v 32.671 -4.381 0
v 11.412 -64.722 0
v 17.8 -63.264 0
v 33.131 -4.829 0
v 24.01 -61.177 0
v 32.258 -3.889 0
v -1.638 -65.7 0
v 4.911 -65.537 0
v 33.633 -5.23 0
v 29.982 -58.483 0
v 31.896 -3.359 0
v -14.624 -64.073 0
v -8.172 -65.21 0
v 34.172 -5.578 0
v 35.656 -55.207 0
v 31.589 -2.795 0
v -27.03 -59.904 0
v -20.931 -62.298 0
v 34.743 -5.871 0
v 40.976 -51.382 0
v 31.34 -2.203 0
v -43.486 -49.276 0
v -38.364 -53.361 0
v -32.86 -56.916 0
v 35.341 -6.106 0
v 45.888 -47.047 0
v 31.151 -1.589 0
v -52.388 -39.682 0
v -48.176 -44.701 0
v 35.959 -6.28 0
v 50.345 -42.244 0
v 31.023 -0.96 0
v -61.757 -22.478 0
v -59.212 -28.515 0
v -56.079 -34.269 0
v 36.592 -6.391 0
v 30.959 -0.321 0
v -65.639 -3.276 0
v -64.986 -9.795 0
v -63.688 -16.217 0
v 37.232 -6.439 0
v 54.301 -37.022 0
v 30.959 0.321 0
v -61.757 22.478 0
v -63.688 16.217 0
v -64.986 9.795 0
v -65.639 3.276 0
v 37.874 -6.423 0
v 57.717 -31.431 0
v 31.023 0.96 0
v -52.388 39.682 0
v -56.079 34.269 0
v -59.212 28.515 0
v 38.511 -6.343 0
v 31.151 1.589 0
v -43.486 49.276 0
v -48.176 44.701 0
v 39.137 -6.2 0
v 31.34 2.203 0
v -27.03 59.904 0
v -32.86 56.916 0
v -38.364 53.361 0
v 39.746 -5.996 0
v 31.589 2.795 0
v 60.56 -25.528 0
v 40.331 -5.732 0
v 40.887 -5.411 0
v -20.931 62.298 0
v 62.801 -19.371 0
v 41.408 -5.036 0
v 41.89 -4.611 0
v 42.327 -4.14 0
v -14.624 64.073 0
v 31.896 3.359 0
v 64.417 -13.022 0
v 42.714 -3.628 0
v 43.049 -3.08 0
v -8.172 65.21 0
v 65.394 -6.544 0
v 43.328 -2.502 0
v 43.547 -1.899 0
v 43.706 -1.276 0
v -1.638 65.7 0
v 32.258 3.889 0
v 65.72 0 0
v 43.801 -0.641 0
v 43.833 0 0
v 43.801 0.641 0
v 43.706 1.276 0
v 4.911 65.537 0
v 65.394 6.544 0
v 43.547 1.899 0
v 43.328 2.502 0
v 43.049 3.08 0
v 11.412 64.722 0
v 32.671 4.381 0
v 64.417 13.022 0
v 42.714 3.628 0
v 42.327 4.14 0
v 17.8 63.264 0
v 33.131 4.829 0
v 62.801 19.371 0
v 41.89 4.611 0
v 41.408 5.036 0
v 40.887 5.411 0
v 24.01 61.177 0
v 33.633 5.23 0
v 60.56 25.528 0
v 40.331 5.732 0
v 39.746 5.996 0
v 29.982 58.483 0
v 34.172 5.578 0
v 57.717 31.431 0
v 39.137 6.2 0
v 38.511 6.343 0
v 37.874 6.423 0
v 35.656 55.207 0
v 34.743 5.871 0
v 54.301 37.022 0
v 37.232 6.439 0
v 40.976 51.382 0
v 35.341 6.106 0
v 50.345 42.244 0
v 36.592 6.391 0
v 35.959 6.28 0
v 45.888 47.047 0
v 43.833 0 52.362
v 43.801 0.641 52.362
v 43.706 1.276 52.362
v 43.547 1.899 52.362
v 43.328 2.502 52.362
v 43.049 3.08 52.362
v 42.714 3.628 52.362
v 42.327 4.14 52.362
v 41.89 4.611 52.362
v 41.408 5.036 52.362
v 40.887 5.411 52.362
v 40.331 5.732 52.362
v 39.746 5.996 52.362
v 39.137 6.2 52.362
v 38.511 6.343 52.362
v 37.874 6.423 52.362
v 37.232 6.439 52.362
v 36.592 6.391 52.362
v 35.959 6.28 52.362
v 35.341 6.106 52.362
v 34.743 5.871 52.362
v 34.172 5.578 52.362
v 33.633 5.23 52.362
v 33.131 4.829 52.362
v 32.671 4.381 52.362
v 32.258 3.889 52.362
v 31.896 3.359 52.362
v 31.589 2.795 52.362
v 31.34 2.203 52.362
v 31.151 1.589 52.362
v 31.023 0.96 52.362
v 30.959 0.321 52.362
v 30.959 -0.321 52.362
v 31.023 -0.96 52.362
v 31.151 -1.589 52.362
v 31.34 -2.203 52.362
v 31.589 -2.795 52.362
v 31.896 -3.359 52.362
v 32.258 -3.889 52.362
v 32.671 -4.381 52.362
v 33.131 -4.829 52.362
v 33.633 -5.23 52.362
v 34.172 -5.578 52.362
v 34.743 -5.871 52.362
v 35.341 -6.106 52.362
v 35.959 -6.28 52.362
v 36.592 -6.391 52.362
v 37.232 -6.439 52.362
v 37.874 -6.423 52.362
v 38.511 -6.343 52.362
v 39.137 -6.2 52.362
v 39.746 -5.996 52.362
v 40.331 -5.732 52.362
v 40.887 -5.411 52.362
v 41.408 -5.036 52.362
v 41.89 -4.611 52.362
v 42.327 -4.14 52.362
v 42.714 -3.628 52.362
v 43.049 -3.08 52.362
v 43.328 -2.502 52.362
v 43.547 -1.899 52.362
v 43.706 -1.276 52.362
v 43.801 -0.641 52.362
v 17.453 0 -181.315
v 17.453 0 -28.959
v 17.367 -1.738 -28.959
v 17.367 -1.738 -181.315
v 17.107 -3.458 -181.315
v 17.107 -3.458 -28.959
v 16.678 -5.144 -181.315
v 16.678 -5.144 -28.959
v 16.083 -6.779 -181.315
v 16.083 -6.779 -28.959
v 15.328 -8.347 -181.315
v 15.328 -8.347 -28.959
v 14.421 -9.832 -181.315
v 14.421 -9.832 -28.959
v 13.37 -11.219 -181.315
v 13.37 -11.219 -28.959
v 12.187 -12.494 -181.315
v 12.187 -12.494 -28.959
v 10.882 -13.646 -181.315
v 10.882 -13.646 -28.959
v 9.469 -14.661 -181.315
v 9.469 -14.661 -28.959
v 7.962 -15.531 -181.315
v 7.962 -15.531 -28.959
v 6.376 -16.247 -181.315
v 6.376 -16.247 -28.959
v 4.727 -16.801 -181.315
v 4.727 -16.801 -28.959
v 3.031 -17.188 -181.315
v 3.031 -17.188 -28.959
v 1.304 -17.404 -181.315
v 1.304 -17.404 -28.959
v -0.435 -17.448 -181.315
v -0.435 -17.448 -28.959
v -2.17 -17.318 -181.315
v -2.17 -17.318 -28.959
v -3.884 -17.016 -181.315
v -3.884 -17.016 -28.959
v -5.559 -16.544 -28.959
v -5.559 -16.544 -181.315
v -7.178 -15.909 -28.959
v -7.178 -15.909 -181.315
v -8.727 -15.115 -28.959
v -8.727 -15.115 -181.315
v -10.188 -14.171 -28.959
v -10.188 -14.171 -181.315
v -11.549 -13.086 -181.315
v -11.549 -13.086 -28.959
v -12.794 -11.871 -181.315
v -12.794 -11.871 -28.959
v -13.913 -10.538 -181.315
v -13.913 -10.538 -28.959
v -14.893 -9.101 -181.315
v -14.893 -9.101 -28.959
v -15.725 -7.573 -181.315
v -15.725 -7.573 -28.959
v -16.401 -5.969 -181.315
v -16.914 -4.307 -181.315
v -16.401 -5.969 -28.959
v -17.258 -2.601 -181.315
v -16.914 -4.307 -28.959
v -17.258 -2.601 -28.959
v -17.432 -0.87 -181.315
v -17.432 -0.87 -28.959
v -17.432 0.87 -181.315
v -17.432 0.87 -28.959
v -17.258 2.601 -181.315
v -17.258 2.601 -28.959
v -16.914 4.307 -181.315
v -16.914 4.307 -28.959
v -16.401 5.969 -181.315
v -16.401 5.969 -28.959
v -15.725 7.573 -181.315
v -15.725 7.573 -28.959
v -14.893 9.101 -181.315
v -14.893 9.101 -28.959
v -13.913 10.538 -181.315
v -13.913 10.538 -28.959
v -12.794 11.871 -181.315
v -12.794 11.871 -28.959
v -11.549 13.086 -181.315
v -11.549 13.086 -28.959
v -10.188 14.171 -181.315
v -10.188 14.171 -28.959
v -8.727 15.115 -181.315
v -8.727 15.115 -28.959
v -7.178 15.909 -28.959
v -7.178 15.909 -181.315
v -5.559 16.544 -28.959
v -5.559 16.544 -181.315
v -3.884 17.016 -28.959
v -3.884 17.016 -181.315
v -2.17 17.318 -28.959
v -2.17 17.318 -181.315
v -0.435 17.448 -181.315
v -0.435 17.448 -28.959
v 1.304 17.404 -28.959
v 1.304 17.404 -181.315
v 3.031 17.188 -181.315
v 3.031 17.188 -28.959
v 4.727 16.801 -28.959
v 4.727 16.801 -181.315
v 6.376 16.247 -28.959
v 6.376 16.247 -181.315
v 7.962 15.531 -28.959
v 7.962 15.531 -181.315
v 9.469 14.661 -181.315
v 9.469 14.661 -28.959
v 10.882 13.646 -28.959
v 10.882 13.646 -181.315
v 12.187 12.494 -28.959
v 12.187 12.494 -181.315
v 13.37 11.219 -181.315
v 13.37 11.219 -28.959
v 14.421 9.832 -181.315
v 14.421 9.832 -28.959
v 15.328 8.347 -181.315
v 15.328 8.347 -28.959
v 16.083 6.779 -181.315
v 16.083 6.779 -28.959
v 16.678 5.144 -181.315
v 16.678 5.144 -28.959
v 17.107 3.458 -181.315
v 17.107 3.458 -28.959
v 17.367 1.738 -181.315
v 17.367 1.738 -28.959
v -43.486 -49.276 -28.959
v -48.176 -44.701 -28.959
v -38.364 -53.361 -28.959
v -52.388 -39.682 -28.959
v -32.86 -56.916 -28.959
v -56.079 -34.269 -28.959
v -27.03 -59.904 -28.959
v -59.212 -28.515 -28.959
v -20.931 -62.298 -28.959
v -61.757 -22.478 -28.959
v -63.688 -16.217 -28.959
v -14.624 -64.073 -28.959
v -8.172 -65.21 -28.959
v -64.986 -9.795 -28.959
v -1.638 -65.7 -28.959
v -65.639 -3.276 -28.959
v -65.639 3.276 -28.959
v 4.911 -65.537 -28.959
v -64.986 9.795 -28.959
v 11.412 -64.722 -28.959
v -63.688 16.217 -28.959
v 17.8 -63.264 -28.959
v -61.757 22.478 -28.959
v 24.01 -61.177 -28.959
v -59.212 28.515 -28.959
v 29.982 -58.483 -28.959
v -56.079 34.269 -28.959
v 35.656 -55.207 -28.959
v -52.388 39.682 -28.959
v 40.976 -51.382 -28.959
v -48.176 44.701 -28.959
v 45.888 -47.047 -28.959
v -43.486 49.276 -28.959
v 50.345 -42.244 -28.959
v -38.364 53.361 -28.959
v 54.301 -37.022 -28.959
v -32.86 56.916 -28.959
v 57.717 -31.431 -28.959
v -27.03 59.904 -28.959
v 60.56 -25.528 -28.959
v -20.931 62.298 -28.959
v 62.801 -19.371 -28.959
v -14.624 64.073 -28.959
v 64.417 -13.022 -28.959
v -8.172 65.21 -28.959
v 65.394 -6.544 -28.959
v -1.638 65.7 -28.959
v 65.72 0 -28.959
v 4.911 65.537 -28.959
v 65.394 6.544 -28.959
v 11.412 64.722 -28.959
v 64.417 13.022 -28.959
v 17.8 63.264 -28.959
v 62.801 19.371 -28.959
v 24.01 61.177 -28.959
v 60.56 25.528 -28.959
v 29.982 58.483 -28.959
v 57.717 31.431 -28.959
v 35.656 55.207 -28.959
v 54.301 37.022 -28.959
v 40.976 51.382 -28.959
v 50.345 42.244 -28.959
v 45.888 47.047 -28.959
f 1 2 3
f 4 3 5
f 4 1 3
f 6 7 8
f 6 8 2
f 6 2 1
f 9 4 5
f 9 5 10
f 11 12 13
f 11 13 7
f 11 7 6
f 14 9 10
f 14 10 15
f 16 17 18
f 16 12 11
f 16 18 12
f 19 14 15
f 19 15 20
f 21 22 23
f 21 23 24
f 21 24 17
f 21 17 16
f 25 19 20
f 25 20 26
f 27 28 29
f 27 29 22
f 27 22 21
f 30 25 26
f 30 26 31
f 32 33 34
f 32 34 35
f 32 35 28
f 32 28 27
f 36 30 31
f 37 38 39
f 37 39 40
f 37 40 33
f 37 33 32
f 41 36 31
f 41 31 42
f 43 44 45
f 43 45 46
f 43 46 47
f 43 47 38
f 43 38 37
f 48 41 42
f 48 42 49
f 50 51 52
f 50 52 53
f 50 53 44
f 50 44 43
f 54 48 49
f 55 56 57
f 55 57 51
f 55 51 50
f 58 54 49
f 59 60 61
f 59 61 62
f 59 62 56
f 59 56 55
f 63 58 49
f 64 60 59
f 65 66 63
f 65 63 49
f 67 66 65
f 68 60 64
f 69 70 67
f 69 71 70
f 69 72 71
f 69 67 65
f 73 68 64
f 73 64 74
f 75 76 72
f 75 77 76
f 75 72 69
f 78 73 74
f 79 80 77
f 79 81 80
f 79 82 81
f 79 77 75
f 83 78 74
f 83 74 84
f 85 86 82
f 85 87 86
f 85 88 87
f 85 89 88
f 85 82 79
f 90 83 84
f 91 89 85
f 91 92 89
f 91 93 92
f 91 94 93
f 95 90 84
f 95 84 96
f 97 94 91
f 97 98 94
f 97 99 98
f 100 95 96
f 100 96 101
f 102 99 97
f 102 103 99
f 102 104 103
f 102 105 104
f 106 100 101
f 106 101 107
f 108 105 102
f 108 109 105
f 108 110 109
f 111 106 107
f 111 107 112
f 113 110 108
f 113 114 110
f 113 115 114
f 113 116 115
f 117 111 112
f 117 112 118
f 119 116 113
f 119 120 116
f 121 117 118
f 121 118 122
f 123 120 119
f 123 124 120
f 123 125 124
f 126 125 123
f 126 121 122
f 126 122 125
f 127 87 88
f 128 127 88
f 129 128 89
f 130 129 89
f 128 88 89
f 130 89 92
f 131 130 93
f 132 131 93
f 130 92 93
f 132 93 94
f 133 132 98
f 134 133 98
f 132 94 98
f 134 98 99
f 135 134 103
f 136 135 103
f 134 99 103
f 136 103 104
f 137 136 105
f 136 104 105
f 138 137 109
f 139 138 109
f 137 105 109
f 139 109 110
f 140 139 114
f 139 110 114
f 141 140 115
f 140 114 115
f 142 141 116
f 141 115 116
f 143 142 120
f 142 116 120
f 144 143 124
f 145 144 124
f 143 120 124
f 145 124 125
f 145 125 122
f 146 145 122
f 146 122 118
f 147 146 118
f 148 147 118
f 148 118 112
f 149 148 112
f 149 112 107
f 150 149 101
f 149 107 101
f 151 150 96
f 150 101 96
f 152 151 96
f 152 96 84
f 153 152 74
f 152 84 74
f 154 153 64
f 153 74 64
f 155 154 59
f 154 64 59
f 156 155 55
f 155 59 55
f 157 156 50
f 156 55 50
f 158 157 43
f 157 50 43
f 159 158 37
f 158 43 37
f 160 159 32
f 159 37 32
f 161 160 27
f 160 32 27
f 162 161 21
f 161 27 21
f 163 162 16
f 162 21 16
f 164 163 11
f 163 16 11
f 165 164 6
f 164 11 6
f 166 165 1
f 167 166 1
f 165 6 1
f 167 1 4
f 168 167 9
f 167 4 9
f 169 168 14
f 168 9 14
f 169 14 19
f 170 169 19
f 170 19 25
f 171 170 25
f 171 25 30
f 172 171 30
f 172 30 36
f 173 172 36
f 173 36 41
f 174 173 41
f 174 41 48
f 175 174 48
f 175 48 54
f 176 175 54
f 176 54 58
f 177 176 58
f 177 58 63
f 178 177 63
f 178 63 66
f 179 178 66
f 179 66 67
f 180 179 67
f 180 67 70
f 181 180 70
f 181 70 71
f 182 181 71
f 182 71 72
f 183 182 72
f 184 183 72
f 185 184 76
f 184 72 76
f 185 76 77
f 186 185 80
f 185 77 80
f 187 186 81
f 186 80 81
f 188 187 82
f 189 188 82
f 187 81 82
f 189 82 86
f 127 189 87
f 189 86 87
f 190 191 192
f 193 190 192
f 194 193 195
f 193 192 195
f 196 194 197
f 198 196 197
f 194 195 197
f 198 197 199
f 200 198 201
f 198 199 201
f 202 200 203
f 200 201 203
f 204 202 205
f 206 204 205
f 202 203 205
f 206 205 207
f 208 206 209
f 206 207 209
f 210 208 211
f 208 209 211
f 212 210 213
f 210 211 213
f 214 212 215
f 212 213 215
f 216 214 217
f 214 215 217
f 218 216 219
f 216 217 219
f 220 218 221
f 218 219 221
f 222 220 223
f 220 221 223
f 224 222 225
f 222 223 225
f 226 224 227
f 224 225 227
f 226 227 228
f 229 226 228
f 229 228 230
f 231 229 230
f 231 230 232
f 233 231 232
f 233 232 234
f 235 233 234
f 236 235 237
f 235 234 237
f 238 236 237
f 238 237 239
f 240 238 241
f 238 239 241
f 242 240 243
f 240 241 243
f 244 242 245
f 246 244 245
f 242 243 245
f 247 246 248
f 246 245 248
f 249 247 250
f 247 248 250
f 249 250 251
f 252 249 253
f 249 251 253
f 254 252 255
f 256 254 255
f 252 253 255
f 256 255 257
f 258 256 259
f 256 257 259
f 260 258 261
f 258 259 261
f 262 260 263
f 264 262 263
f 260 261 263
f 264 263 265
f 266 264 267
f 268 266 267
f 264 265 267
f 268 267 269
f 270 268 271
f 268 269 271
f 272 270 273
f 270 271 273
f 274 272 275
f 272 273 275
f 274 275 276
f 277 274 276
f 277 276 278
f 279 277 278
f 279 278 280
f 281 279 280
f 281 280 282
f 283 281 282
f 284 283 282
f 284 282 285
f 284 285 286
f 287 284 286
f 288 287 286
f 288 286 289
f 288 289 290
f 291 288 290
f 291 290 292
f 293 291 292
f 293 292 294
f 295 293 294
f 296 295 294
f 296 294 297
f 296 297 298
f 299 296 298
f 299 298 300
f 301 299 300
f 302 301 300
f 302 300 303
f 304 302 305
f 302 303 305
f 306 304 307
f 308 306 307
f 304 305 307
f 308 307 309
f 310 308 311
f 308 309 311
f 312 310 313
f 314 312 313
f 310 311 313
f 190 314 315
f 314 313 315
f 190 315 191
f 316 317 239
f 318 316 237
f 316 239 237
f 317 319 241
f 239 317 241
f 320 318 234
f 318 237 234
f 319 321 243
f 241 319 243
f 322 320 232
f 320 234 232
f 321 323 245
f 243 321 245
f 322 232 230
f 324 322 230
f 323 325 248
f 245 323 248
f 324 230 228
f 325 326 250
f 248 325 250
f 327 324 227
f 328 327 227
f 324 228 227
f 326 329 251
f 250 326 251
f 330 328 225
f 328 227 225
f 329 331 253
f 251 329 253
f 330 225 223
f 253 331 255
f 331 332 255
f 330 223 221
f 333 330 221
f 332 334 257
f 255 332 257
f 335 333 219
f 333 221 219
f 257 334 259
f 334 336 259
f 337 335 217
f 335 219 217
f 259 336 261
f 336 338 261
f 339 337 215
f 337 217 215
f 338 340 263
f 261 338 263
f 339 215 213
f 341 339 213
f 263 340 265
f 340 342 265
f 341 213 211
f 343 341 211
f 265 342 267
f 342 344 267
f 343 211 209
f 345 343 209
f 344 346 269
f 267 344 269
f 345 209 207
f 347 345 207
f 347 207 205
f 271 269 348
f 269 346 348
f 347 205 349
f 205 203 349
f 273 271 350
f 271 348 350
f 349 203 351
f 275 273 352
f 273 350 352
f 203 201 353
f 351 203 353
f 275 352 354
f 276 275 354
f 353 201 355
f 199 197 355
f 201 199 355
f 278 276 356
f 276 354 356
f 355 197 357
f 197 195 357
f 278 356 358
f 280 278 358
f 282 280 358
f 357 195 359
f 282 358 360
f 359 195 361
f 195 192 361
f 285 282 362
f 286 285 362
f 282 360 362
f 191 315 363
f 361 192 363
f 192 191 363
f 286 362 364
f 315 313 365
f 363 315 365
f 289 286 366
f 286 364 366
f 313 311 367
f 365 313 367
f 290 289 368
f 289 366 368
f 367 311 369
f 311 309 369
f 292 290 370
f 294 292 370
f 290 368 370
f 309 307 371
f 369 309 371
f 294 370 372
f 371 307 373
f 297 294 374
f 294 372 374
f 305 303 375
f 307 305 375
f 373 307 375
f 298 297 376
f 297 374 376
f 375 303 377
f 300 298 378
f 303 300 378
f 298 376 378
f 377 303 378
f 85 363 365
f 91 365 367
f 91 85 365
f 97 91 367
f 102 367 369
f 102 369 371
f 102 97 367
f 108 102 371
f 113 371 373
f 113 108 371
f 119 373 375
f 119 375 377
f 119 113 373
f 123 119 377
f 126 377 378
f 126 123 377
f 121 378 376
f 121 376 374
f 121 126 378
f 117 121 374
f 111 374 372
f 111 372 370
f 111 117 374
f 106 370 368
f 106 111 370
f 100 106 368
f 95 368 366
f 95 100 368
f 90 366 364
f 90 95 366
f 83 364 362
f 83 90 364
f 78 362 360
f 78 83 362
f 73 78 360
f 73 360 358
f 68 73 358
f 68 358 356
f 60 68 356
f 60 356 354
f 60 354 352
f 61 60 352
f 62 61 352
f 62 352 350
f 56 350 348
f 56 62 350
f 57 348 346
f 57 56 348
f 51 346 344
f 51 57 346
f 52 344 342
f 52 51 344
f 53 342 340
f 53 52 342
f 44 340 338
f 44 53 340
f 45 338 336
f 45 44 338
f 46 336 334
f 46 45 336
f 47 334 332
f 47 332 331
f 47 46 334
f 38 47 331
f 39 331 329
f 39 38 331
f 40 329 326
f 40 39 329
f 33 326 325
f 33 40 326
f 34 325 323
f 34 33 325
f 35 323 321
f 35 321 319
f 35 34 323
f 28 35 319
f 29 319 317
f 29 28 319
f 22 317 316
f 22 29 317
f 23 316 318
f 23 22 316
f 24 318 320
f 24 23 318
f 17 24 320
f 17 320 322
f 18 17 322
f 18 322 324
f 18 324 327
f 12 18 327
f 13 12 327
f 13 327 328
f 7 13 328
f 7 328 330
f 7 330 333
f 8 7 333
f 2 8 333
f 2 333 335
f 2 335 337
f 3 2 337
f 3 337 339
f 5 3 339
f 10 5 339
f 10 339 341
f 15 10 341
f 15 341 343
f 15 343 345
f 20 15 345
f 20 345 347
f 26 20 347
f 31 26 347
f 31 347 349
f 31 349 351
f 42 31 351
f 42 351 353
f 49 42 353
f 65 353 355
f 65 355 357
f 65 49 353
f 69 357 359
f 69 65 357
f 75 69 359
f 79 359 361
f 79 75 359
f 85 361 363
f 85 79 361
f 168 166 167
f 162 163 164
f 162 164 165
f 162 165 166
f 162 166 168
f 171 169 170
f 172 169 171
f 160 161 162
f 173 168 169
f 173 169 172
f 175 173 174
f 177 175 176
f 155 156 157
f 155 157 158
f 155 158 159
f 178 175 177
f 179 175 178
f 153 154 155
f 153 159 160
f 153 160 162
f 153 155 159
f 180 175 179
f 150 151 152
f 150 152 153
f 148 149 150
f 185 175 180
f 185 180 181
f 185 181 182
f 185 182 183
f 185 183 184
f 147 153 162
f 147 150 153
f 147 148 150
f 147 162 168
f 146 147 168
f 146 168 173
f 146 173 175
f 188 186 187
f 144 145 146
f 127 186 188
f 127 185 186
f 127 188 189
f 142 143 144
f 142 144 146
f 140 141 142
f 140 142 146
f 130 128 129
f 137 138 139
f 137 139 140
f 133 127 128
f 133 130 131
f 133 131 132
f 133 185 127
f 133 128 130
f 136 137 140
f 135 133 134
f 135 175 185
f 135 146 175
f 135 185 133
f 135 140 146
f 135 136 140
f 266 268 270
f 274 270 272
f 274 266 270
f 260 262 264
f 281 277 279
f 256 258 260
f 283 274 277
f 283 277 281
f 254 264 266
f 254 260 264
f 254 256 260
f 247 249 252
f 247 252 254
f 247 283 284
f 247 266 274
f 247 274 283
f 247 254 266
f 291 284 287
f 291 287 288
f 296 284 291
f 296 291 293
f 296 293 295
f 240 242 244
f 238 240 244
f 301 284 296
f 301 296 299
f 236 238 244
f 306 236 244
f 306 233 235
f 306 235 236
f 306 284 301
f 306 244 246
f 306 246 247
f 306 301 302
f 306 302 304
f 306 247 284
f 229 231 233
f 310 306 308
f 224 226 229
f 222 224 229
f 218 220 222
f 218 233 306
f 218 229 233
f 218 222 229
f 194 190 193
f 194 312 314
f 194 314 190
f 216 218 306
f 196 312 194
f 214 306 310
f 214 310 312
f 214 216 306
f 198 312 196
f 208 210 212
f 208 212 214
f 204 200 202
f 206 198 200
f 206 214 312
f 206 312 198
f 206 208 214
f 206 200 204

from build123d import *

# Parameters (mm, degrees)
F0_R     = 65.720359
F1_DEPTH = 28.95929
F2_R     = 6.440995
F3_DEPTH = 52.36186
F4_R     = 17.45325
F5_DEPTH = 152.35555


with BuildPart() as f1:
    # F0 (on Top) → F1 (new body)
    with BuildSketch(Plane.XY):
        Circle(F0_R)
    extrude(amount=-F1_DEPTH)

    # F2 (on Top) → F3 (join)
    with BuildSketch(Plane.XY):
        with Locations((37.392426, 0)):
            Circle(F2_R)
    extrude(amount=F3_DEPTH)

    # F4 (on face) → F5 (join)
    with BuildSketch(Plane(origin=(0, 0, -28.95929), x_dir=(1, 0, 0), z_dir=(0, 0, -1))):
        Circle(F4_R)
    extrude(amount=F5_DEPTH)


solid = f1.part
